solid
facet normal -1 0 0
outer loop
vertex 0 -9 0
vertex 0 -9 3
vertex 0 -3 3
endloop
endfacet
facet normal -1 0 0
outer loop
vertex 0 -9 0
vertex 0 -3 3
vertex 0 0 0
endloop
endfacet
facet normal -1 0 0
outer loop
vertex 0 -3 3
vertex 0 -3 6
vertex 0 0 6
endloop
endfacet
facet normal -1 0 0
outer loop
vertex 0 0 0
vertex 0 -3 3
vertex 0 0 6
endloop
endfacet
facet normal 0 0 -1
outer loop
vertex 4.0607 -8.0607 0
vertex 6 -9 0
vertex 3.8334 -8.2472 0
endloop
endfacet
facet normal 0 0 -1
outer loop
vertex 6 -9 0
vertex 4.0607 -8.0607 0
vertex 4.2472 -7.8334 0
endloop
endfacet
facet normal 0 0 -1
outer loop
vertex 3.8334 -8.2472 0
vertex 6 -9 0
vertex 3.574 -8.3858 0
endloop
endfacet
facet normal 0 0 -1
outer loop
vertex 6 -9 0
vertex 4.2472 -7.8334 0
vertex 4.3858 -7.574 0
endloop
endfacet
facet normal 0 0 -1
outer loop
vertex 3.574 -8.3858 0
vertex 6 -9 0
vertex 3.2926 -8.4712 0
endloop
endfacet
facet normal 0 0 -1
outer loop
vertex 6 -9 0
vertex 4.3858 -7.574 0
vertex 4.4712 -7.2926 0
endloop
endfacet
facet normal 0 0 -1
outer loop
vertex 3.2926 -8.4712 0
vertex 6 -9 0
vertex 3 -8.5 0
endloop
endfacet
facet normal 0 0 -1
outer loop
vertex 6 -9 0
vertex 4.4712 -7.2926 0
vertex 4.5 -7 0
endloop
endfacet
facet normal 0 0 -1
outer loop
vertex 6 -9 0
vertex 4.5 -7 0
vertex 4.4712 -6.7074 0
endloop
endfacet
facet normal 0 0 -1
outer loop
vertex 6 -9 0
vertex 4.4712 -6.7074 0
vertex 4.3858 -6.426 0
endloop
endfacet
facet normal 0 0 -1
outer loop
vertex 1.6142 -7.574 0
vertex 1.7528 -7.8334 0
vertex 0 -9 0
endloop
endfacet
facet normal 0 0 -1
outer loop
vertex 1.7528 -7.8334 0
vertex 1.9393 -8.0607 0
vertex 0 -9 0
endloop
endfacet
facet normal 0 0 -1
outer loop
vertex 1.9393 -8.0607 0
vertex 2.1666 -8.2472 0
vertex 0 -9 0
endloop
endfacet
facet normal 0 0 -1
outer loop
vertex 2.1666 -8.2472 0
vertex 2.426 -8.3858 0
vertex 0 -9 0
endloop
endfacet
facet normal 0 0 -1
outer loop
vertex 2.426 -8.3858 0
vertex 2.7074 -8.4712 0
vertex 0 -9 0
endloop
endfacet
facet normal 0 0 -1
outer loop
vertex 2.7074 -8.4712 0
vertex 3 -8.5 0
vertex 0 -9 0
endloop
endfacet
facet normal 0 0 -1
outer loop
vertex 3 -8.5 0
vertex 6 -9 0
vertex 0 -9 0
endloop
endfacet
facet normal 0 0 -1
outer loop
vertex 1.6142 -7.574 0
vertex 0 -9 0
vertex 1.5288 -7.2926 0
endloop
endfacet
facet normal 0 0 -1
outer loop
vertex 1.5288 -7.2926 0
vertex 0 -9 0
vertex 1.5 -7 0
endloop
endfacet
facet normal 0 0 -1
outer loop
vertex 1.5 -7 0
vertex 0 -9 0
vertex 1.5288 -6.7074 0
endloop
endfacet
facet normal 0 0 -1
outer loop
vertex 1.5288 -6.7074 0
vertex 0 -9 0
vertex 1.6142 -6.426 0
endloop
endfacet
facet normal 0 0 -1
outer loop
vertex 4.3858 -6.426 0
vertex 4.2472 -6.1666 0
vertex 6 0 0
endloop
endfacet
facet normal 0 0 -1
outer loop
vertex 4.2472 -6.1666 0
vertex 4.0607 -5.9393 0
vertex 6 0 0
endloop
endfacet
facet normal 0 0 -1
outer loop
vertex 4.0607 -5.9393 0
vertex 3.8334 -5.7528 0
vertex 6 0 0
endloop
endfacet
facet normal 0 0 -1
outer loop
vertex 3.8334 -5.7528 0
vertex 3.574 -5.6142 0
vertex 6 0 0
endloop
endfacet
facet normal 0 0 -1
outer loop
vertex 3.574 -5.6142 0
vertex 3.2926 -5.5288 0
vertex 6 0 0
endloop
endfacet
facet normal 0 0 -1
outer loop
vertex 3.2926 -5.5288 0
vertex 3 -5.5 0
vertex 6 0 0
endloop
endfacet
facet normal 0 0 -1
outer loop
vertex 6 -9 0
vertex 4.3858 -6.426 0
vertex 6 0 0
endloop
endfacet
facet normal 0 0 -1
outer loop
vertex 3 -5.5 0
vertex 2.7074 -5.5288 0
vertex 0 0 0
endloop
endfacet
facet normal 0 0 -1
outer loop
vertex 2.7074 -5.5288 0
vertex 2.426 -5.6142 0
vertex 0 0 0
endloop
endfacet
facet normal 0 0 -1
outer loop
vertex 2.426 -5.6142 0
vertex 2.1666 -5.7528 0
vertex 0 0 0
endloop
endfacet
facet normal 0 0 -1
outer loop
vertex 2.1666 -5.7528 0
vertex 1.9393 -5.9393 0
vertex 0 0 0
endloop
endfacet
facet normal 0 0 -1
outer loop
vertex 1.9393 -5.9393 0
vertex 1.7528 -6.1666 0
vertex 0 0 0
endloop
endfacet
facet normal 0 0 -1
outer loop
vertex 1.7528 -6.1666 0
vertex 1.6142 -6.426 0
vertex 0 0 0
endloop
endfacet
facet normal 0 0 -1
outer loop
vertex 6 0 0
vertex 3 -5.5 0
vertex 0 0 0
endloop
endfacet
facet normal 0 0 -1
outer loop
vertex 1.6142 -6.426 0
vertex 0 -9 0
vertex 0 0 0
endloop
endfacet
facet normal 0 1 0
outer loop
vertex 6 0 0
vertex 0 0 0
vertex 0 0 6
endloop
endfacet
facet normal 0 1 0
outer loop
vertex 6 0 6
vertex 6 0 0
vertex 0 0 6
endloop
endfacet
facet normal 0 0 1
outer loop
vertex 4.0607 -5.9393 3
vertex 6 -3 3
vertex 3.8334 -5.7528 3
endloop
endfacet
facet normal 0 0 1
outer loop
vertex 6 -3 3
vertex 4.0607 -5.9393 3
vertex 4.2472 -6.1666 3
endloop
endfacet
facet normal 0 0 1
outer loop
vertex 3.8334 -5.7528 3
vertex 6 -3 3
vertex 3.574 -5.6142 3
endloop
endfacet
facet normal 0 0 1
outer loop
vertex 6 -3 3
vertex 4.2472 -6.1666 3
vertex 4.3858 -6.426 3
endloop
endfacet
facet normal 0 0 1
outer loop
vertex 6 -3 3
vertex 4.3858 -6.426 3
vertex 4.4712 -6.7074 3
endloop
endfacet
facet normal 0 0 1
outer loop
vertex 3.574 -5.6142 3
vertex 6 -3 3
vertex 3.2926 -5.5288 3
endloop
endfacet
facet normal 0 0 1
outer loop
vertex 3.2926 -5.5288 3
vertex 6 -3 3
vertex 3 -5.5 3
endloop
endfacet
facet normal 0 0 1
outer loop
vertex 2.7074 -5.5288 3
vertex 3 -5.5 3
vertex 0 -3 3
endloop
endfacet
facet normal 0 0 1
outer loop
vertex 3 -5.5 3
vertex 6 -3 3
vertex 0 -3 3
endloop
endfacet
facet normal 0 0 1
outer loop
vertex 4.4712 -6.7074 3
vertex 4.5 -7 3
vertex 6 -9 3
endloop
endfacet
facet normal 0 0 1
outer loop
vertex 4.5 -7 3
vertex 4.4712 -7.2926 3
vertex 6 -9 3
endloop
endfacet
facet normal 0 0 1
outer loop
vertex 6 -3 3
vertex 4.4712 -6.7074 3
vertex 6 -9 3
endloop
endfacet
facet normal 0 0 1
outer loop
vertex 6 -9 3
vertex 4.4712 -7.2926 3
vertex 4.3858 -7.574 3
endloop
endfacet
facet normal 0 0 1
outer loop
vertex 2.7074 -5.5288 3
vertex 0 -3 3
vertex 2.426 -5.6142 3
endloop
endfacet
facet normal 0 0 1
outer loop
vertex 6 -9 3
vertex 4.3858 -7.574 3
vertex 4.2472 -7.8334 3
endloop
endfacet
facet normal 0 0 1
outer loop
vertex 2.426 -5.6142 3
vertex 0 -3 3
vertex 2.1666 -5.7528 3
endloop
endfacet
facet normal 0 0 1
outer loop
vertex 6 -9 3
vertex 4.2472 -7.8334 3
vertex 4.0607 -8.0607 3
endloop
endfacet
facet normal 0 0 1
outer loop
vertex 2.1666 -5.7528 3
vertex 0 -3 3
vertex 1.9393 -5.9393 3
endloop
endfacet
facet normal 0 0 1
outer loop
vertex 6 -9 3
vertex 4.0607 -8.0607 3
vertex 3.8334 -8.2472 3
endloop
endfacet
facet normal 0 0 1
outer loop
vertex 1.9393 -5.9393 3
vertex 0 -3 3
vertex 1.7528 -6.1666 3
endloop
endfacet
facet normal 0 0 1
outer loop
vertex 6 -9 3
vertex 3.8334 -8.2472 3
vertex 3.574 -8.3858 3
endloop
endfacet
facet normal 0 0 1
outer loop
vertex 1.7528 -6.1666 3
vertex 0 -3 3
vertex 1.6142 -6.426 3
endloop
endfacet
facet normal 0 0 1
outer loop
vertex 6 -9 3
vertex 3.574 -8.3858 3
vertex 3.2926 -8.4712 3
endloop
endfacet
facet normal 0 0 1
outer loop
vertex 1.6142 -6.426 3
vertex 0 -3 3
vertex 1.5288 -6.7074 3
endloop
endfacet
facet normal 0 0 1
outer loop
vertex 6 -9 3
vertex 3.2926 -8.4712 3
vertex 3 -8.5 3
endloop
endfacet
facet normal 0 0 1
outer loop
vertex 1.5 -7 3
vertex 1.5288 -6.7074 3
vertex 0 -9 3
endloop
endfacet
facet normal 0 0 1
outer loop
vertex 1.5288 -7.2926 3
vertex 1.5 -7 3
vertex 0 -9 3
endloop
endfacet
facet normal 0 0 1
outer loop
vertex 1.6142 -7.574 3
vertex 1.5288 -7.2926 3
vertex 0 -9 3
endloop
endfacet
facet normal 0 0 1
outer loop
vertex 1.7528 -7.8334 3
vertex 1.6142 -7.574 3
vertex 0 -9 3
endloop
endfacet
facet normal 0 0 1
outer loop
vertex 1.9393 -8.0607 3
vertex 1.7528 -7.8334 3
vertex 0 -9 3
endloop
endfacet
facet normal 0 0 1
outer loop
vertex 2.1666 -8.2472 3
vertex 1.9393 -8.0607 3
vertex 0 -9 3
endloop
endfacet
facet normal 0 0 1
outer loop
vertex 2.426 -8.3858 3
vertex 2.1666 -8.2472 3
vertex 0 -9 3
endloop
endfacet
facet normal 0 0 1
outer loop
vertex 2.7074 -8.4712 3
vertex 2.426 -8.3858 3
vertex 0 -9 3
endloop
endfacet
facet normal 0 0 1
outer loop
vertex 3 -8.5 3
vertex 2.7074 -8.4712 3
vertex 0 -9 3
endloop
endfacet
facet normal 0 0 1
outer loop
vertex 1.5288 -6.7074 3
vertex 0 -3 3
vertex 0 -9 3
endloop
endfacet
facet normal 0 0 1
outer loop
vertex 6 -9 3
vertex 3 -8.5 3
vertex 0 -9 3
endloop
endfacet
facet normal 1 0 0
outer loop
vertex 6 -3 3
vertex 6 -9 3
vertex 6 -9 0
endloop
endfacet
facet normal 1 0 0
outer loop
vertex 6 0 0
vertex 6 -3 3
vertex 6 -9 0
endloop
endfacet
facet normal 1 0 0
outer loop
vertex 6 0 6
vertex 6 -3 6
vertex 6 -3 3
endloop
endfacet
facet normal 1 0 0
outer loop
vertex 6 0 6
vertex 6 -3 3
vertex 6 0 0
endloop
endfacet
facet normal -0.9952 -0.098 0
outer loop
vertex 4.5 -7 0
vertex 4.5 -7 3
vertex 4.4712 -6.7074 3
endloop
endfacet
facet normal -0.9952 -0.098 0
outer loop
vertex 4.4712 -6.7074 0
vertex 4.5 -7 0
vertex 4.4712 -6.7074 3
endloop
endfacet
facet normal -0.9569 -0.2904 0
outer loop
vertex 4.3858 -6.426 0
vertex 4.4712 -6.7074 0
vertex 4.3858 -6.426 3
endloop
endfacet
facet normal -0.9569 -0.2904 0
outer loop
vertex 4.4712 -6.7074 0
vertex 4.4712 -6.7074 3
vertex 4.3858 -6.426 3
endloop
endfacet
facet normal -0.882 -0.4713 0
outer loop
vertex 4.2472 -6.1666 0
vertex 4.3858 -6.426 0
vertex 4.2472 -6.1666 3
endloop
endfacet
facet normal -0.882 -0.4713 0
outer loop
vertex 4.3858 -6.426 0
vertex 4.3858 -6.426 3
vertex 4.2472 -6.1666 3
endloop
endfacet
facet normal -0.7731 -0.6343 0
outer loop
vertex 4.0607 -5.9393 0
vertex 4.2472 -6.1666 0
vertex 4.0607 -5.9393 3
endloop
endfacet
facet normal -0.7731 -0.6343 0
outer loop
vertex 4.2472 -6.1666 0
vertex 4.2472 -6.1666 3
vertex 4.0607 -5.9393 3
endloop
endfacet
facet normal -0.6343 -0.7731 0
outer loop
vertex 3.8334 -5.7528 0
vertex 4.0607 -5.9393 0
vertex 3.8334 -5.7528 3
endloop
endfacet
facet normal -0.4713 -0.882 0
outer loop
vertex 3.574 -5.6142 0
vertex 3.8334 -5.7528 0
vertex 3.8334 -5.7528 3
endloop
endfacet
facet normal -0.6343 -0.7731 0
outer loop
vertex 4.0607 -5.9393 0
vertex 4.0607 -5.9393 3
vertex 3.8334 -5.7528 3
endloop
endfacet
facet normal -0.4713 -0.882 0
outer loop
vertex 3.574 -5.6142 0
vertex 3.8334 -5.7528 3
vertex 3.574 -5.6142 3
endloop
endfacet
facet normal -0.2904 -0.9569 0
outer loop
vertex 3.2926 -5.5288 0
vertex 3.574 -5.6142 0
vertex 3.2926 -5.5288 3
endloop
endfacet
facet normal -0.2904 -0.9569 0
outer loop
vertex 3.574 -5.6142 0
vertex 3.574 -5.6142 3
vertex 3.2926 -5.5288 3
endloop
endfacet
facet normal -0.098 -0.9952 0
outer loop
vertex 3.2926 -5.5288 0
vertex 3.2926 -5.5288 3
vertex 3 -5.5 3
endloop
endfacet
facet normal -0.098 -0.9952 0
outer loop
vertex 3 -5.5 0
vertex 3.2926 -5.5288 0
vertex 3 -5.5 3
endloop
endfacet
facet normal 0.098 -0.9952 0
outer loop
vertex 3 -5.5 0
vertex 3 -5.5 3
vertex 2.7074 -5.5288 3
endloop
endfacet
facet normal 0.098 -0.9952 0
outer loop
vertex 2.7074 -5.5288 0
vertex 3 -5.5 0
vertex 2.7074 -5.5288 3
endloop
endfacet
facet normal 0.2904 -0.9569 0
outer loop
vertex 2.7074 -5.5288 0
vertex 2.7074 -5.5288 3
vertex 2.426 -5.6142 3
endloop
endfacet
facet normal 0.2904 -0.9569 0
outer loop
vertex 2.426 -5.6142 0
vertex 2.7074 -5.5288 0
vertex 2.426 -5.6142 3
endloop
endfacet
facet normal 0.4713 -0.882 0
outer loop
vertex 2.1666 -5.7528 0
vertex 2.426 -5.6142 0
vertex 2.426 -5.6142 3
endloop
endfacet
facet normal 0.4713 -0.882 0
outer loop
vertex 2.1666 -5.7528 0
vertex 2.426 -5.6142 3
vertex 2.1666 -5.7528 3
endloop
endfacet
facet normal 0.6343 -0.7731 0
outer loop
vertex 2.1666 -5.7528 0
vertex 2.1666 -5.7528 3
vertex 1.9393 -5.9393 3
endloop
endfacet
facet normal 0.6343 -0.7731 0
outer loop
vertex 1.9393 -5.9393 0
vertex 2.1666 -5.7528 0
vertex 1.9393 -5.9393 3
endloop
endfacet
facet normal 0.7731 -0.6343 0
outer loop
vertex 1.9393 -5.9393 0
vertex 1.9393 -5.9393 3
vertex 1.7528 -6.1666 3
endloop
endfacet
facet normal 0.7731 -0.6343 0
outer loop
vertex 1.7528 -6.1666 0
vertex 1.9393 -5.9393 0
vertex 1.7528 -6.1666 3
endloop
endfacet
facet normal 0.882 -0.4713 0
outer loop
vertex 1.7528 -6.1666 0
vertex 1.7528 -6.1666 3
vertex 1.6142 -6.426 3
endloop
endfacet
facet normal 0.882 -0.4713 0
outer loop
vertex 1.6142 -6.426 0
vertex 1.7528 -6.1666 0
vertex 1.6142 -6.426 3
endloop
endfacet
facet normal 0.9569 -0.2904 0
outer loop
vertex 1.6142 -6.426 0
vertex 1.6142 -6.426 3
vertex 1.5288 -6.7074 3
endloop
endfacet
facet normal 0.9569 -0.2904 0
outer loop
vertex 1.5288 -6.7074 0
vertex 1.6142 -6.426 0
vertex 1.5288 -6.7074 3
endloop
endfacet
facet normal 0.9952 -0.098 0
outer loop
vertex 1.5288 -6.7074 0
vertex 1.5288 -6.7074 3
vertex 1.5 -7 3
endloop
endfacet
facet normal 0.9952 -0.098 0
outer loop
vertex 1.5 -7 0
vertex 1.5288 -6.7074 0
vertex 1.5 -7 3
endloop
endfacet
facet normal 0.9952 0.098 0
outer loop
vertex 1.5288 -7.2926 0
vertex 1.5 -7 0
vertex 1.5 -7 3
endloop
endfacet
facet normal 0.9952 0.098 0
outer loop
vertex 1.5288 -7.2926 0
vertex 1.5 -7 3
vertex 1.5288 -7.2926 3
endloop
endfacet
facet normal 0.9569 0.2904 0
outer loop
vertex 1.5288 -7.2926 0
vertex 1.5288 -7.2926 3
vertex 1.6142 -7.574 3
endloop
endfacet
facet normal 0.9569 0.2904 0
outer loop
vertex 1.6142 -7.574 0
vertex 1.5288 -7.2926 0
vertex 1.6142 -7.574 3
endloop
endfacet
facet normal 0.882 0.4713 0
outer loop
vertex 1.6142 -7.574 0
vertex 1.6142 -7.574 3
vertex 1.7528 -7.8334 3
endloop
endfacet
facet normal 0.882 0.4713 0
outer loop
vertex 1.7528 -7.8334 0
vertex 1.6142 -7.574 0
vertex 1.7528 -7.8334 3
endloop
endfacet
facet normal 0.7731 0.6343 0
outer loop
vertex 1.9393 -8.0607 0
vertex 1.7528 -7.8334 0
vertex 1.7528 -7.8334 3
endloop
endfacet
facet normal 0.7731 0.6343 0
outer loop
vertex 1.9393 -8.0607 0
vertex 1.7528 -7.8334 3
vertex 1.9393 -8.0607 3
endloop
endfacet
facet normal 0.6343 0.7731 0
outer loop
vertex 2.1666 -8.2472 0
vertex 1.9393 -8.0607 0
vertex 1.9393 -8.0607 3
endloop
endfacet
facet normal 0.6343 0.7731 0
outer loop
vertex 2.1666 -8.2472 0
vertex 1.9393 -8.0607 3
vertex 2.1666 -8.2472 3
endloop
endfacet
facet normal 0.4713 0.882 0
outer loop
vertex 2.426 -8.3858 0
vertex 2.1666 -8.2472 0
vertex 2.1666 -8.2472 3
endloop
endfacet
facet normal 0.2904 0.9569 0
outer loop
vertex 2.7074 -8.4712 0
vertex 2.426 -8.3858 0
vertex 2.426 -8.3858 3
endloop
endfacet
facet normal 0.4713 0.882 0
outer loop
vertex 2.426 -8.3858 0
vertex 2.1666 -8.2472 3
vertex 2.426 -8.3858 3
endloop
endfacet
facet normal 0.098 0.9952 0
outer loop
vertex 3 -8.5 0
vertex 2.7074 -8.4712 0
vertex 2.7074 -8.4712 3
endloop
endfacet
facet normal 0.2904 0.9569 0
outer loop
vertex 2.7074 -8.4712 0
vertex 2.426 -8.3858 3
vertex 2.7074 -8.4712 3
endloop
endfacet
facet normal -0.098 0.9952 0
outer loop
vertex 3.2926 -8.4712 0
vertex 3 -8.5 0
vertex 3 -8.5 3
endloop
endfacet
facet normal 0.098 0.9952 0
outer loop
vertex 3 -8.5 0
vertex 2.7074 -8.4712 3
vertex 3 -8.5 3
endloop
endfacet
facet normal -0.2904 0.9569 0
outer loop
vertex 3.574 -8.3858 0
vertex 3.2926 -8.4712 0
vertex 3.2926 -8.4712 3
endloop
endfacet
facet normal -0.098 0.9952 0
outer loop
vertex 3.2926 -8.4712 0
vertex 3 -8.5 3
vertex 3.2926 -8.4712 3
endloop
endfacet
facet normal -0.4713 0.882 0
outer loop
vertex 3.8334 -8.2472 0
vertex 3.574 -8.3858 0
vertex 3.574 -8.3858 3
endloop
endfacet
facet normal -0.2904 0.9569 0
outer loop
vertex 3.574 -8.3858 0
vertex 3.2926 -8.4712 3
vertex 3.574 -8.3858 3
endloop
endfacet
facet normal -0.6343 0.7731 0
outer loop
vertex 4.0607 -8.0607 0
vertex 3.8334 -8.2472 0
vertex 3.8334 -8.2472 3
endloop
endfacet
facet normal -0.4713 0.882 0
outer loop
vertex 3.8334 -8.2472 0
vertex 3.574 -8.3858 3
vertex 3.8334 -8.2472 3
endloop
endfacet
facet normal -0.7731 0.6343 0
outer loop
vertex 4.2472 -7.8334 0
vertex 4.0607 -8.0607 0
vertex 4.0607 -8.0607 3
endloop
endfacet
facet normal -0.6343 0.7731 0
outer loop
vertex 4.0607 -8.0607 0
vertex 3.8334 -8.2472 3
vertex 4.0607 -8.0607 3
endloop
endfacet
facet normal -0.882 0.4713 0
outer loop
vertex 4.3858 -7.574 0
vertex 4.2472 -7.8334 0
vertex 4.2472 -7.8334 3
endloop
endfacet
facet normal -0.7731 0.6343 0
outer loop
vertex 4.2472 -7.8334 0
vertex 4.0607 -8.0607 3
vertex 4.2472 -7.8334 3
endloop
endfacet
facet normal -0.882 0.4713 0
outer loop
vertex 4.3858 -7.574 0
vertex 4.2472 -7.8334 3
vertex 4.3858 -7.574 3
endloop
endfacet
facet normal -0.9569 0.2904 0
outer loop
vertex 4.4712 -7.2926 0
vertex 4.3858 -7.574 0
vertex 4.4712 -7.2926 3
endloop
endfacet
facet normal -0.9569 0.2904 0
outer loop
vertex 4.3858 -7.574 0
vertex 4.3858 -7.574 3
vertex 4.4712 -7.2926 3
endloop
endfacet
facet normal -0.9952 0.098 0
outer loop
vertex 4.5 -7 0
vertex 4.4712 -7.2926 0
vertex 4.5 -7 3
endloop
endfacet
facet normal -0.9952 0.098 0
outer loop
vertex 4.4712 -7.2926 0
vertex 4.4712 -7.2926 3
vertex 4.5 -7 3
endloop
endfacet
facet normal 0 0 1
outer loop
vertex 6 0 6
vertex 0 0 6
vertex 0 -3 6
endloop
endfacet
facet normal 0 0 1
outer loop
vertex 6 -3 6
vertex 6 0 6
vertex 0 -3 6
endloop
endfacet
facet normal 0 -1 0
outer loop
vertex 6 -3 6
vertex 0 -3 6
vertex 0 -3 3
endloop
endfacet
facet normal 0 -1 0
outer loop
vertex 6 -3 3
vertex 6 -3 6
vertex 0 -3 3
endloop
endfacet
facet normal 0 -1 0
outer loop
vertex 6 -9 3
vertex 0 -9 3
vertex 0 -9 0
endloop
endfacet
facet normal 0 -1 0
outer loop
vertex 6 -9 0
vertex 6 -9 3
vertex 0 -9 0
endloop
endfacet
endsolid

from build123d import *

# Parameters (mm, degrees)
F1_DEPTH = 6
F2_R     = 1.5
F3_DEPTH = 25


with BuildPart() as f1:
    # F0 (on Right) → F1 (new body)
    with BuildSketch(Plane.YZ):
        Polygon((-9, 0), (0, 0), (0, 6), (-3, 6), (-3, 3), (-9, 3), align=None)
    extrude(amount=F1_DEPTH)

    # F2 (on face) → F3 (cut)
    with BuildSketch(Plane.XY.offset(3)):
        with Locations((3, -7)):
            Circle(F2_R)
    extrude(amount=-F3_DEPTH, mode=Mode.SUBTRACT)


solid = f1.part
